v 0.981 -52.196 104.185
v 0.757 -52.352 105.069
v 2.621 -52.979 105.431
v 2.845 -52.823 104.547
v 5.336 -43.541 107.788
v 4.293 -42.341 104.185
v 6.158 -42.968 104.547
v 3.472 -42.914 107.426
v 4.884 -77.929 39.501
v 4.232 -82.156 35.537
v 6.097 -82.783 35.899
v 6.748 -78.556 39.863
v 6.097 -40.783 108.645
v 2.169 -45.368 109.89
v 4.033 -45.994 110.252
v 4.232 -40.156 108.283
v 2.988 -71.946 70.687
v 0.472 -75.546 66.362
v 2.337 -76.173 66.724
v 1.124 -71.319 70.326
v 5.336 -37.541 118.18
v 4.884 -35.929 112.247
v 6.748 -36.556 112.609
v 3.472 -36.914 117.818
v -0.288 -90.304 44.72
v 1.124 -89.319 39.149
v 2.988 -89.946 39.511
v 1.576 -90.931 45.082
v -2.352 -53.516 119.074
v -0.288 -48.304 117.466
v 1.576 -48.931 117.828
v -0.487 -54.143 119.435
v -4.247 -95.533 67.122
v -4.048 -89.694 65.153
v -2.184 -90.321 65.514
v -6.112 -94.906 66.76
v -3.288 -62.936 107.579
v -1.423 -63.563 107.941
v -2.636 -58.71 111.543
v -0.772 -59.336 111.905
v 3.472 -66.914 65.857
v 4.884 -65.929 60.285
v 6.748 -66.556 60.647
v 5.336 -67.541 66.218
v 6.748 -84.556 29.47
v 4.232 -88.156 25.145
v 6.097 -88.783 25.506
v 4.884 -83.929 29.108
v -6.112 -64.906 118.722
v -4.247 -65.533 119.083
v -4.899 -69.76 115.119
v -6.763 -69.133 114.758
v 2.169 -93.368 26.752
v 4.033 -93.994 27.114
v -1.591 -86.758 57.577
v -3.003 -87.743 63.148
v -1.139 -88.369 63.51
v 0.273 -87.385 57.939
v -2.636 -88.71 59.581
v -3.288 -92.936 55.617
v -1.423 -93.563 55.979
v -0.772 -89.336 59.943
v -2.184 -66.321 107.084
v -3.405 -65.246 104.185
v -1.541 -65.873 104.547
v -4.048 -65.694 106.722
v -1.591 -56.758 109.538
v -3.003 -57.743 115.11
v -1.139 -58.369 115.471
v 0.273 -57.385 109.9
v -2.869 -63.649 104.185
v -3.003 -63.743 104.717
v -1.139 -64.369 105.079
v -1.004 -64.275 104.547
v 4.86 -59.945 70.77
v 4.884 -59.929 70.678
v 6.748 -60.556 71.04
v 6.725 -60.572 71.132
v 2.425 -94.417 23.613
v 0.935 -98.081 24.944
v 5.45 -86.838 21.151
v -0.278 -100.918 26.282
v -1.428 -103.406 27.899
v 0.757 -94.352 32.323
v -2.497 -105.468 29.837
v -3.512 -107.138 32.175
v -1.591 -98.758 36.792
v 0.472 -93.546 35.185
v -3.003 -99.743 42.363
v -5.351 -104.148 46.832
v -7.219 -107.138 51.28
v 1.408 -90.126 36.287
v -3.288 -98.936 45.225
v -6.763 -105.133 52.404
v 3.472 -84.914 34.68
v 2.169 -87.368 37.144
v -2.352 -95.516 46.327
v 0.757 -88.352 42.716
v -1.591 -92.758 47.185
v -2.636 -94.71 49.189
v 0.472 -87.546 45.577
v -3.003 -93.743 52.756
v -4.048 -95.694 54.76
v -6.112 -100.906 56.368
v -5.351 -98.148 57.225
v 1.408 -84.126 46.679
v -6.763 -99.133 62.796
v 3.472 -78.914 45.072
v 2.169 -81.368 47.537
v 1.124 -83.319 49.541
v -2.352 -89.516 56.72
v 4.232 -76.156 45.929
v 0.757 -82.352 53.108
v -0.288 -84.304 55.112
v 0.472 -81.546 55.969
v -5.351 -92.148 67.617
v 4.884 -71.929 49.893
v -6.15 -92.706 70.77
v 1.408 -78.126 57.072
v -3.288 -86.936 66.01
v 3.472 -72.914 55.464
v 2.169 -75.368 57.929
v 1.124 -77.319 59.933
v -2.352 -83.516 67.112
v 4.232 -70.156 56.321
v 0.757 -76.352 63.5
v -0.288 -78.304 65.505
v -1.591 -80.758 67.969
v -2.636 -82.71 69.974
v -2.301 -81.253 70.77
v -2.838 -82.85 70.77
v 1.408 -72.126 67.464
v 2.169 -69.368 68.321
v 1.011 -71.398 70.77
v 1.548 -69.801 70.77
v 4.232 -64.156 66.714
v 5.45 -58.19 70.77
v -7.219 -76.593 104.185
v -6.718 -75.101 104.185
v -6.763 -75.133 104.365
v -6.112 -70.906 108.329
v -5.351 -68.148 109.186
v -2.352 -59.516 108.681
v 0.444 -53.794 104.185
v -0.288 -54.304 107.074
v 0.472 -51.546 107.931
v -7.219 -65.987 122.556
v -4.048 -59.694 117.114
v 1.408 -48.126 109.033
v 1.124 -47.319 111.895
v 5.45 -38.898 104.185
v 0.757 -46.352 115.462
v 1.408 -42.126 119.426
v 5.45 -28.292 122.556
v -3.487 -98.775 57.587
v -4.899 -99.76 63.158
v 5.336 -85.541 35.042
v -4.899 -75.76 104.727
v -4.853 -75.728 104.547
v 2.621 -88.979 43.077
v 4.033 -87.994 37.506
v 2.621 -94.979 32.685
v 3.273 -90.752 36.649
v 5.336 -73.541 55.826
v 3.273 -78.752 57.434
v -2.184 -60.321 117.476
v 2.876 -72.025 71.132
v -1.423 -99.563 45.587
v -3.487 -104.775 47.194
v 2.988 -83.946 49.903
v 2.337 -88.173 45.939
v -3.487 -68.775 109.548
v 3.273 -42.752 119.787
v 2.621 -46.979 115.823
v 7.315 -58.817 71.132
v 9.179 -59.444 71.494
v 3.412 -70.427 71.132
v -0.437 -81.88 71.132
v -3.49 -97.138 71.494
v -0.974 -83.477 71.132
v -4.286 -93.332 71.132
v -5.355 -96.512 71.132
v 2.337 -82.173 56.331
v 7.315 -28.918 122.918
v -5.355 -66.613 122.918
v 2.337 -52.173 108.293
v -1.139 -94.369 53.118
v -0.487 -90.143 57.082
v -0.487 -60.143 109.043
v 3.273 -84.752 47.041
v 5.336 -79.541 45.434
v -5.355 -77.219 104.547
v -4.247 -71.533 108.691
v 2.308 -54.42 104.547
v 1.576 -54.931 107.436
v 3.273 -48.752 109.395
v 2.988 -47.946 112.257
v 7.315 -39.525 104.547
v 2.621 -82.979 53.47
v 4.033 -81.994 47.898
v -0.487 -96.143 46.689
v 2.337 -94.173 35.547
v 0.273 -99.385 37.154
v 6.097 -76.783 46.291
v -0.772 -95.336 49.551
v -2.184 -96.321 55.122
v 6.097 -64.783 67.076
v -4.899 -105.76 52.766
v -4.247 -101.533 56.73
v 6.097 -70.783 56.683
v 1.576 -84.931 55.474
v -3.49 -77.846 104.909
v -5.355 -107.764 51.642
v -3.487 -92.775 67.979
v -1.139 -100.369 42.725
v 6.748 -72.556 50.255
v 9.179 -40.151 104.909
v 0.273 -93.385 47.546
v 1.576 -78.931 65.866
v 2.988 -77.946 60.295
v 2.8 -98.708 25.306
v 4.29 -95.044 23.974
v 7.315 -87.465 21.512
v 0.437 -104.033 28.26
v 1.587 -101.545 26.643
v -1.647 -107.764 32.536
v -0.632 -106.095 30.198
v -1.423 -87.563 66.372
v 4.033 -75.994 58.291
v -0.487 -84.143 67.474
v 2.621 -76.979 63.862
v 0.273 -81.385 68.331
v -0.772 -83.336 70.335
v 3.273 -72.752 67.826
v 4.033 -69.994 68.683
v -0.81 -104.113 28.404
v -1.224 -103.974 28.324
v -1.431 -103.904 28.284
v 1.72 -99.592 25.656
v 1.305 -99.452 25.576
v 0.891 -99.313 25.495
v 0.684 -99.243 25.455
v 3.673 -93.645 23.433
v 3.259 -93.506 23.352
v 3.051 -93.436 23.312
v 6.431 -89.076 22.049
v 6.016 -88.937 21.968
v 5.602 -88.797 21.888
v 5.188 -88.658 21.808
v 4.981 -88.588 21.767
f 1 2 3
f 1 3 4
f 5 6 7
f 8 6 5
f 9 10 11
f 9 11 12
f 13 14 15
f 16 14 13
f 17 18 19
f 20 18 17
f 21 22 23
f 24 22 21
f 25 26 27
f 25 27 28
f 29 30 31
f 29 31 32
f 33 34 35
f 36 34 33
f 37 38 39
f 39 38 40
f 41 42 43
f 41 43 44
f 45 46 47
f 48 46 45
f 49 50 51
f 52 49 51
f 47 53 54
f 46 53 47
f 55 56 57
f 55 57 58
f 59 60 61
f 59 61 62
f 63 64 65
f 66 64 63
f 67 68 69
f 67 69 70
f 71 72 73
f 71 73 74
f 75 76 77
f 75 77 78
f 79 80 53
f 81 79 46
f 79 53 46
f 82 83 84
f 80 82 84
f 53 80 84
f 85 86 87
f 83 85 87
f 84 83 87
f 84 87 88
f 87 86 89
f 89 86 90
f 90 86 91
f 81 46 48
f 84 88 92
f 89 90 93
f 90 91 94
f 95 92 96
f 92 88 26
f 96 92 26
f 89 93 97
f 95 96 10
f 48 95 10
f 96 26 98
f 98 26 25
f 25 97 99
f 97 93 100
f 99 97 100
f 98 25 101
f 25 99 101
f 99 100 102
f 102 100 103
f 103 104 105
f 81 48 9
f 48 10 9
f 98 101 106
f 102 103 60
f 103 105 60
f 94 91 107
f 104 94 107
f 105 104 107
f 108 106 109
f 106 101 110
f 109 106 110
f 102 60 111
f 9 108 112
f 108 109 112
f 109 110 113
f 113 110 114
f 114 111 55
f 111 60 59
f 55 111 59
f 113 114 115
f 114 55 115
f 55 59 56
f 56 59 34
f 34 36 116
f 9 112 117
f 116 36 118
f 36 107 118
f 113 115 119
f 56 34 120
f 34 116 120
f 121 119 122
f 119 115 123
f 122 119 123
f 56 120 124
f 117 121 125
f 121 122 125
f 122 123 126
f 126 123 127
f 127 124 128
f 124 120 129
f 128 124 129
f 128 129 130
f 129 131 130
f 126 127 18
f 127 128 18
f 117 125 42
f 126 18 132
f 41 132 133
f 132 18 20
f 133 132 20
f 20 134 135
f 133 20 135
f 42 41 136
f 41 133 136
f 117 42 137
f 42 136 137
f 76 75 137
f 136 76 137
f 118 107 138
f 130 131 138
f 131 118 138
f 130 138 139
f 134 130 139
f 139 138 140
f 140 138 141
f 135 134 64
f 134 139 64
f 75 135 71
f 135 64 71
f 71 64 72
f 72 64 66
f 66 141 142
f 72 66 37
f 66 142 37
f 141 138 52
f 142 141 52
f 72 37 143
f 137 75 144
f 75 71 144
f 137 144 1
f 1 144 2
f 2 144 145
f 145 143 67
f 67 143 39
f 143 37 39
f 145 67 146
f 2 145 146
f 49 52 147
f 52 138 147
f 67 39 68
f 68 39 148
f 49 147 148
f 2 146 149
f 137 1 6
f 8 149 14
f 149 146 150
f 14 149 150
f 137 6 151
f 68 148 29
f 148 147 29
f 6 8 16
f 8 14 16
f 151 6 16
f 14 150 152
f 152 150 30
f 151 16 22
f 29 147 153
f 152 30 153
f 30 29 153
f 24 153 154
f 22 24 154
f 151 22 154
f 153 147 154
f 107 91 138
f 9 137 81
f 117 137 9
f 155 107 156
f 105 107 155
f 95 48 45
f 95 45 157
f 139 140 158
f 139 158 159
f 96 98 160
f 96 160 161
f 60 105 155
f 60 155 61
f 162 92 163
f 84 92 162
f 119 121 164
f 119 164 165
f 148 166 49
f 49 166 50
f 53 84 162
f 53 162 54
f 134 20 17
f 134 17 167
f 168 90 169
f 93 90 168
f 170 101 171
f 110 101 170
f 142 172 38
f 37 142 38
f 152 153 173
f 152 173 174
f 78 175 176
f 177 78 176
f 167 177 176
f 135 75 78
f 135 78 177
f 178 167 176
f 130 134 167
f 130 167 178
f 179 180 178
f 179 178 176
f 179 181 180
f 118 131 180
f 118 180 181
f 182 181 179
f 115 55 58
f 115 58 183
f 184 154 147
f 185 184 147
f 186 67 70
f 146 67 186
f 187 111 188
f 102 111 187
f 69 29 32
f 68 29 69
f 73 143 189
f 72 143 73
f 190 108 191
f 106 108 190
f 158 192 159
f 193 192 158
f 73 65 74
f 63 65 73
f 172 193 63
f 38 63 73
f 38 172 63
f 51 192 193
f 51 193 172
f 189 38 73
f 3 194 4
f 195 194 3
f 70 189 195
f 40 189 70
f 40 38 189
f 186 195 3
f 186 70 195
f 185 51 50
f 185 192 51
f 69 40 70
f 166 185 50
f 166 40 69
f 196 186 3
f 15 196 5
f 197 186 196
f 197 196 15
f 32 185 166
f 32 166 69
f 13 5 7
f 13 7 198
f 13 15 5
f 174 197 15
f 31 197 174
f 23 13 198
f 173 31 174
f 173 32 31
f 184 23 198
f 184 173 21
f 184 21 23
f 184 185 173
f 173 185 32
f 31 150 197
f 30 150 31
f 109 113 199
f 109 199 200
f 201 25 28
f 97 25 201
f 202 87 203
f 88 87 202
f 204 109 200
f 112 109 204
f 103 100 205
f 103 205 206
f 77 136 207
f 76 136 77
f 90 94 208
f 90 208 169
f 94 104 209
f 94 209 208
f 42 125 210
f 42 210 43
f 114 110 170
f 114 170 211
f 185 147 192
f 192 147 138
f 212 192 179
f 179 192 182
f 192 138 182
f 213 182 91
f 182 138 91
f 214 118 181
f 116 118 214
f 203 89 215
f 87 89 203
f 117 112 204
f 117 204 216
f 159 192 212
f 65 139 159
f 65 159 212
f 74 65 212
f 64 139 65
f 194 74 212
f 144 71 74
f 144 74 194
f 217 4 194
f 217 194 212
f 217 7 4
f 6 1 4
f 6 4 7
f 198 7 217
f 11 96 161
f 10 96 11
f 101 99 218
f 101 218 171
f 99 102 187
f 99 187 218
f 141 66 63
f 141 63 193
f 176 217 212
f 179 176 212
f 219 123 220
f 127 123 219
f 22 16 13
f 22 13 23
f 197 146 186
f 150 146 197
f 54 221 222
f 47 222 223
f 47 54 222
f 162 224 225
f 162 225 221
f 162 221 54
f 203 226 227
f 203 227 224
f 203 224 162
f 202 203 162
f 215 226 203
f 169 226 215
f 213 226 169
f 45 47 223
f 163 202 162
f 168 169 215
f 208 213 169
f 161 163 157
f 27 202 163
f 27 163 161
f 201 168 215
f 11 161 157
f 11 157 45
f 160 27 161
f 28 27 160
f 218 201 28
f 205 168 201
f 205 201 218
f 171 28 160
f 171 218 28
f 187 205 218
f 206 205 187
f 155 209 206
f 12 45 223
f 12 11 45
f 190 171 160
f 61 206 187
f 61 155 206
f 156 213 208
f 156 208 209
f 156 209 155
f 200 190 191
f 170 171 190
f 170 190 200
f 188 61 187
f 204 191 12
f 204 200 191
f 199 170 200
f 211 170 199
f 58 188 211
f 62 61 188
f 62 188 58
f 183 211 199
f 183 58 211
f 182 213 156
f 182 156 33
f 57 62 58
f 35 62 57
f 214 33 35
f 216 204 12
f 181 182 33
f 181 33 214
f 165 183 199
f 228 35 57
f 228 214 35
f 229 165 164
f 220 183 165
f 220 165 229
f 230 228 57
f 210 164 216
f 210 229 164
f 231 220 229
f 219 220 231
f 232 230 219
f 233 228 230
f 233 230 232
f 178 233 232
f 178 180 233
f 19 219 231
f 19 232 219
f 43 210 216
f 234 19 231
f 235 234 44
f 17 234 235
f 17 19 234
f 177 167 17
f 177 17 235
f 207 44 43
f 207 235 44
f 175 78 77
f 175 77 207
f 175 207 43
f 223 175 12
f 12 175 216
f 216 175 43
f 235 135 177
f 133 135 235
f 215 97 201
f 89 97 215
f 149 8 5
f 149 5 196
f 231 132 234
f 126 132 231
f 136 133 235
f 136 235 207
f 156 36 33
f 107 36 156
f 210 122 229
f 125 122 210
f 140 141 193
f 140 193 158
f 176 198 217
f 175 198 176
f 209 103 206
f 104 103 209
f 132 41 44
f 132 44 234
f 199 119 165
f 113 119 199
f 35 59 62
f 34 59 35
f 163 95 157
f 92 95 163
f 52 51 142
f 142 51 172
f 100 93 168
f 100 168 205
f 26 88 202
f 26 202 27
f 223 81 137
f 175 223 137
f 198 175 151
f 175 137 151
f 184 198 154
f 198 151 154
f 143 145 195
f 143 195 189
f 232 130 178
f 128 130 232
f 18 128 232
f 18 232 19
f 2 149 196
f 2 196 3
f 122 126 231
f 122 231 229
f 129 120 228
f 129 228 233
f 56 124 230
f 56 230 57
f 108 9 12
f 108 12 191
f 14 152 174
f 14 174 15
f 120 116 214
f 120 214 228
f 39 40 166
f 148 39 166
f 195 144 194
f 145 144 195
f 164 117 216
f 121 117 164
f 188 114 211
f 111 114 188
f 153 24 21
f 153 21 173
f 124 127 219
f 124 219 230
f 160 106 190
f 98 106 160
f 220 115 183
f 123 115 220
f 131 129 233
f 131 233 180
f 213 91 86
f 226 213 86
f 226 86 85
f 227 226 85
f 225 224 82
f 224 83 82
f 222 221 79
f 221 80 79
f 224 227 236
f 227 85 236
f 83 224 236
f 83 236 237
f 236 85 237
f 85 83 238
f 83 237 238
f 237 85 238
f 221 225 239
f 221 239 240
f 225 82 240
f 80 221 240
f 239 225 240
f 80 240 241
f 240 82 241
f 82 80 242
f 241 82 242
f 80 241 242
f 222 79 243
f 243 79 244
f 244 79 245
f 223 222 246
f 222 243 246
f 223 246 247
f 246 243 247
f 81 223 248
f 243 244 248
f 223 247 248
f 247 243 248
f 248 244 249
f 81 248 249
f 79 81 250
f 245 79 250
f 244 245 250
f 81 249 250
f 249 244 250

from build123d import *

# Parameters (mm, degrees)
BOSS_EXTRUDE1_DEPTH      = 2
CUT_EXTRUDE2_DEPTH       = 2
FILL_START               = 36.116581205
FILL_PATTERN1_DEPTH      = 2
BOSS_EXTRUDE2_DEPTH      = 2
BOSS_EXTRUDE2_DEPTH_BACK = 2


# Read off the part's stored shape, not the designer's step: Fill Pattern1
with BuildPart() as part:
    # Sketch1 → Boss-Extrude1 (new body)
    with BuildSketch(Plane(origin=(33.669790065, -11.316558939, 6.533618345), x_dir=(0.3075963595688898, 0.9496429323114018, 0.059689033255435724), z_dir=(0.9322529691900319, -0.3133341684384297, 0.1809035663699512))):
        with BuildLine():
            Line((-57.568945453, 121.68686406), (-100.902387075, 51.715943852))
            Line((-100.902387075, 51.715943852), (-100.902387075, 32.254389388))
            add(Edge.make_bspline(
                [(-100.902387075, 32.254389388), (-100.442473357, 31.458808563), (-99.383581078, 29.928136313), (-97.483264926, 27.996228976), (-95.226180551, 26.317886768), (-92.562665334, 24.828690878), (-89.619940932, 23.519356376), (-86.433701886, 22.304158353), (-83.615975501, 21.289615886), (-81.305064927, 20.428782251), (-80.113678401, 19.962997336), (-79.526238835, 19.725091457)],
                knots=[0.001143674, 0.001143674, 0.001143674, 0.001143674, 0.119233579, 0.237323485, 0.35541339, 0.473503295, 0.5915932, 0.709683105, 0.82777301, 0.886817963, 0.945862915, 0.945862915, 0.945862915, 0.945862915], degree=3))
            Line((-79.526238835, 19.725091457), (-17.875333173, 119.273395013))
            Line((-17.875333173, 119.273395013), (-57.568945453, 121.68686406))
        make_face()
    extrude(amount=BOSS_EXTRUDE1_DEPTH)

    # Sketch2 → Cut-Extrude2 (cut)
    with BuildSketch(Plane(origin=(35.534296004, -11.943227276, 6.895425478), x_dir=(0.30759635956877757, 0.9496429323114396, 0.05968903325541397), z_dir=(0.9322529691900542, -0.3133341684383154, 0.18090356637003419))):
        Polygon((-60.882260573, 113.944557721), (-59.845221607, 108.206275442), (-54.357203896, 106.235236392), (-49.906225151, 110.002479621), (-50.943264117, 115.7407619), (-56.431281828, 117.71180095), align=None)
    extrude(amount=-CUT_EXTRUDE2_DEPTH, mode=Mode.SUBTRACT)

    # Fill Pattern1 outline → Fill Pattern1 (cut)
    with BuildSketch(Plane(origin=(0, 0, 0), x_dir=(0.3075963595751989, 0.9496429323114397, 0.05968903322232153), z_dir=(0.9322529691900542, -0.31333416843831513, 0.18090356637003466)).offset(FILL_START)):
        Polygon((-82.988049322, 35.354420584), (-87.439028067, 31.587177355), (-86.4019891, 25.848895075), (-80.913971389, 23.877856025), (-76.462992645, 27.645099254), (-77.500031611, 33.383381534), align=None)
        Polygon((-38.760899761, 106.768419503), (-43.211878505, 103.001176274), (-42.174839539, 97.262893995), (-36.686821828, 95.291854945), (-32.235843083, 99.059098174), (-33.27288205, 104.797380453), align=None)
        Polygon((-50.755172908, 107.139110303), (-55.206151653, 103.371867074), (-54.169112686, 97.633584795), (-48.681094975, 95.662545745), (-44.230116231, 99.429788974), (-45.267155197, 105.168071253), align=None)
        Polygon((-45.079063984, 96.566419658), (-49.530042728, 92.799176429), (-48.493003762, 87.060894149), (-43.004986051, 85.089855099), (-38.554007306, 88.857098328), (-39.591046273, 94.595380608), align=None)
        Polygon((-62.749446055, 107.509801103), (-67.2004248, 103.742557873), (-66.163385834, 98.004275594), (-60.675368123, 96.033236544), (-56.224389378, 99.800479773), (-57.261428344, 105.538762052), align=None)
        Polygon((-44.437008685, 117.341110149), (-48.88798743, 113.573866919), (-47.850948463, 107.83558464), (-42.362930752, 105.86454559), (-37.911952008, 109.631788819), (-38.948990974, 115.370071098), align=None)
        Polygon((-32.442735538, 116.970419349), (-36.893714282, 113.20317612), (-35.856675316, 107.464893841), (-30.368657605, 105.493854791), (-25.91767886, 109.26109802), (-26.954717827, 114.999380299), align=None)
        Polygon((-88.022102947, 66.70180172), (-92.473081692, 62.934558491), (-91.436042726, 57.196276212), (-85.948025015, 55.225237161), (-81.49704627, 58.992480391), (-82.534085236, 64.73076267), align=None)
        Polygon((-70.351720876, 55.758420275), (-74.802699621, 51.991177046), (-73.765660654, 46.252894767), (-68.277642943, 44.281855717), (-63.826664199, 48.049098946), (-64.863703165, 53.787381225), align=None)
        Polygon((-81.703938724, 76.903801566), (-86.154917469, 73.136558336), (-85.117878503, 67.398276057), (-79.629860792, 65.427237007), (-75.178882047, 69.194480236), (-76.215921013, 74.932762515), align=None)
        Polygon((-76.0278298, 66.33111092), (-80.478808545, 62.563867691), (-79.441769579, 56.825585412), (-73.953751868, 54.854546362), (-69.502773123, 58.621789591), (-70.539812089, 64.36007187), align=None)
        Polygon((-94.34026717, 56.499801874), (-98.791245915, 52.732558645), (-97.754206949, 46.994276366), (-92.266189238, 45.023237316), (-87.815210493, 48.790480545), (-88.852249459, 54.528762824), align=None)
        Polygon((-88.664158246, 45.927111229), (-93.115136991, 42.159868), (-92.078098025, 36.421585721), (-86.590080314, 34.450546671), (-82.139101569, 38.2177899), (-83.176140535, 43.956072179), align=None)
        Polygon((-82.345994023, 56.129111075), (-86.796972768, 52.361867846), (-85.759933802, 46.623585566), (-80.271916091, 44.652546516), (-75.820937346, 48.419789745), (-76.857976312, 54.158072025), align=None)
        Polygon((-76.669885099, 45.556420429), (-81.120863844, 41.7891772), (-80.083824877, 36.050894921), (-74.595807166, 34.079855871), (-70.144828422, 37.8470991), (-71.181867388, 43.585381379), align=None)
        Polygon((-69.067610278, 97.307801257), (-73.518589023, 93.540558028), (-72.481550057, 87.802275749), (-66.993532346, 85.831236698), (-62.542553601, 89.598479928), (-63.579592567, 95.336762207), align=None)
        Polygon((-63.391501354, 86.735110612), (-67.842480099, 82.967867383), (-66.805441132, 77.229585103), (-61.317423421, 75.258546053), (-56.866444677, 79.025789282), (-57.903483643, 84.764071561), align=None)
        Polygon((-57.073337131, 96.937110457), (-61.524315876, 93.169867228), (-60.487276909, 87.431584949), (-54.999259198, 85.460545899), (-50.548280454, 89.227789128), (-51.58531942, 94.966071407), align=None)
        Polygon((-51.397228207, 86.364419812), (-55.848206951, 82.597176583), (-54.811167985, 76.858894304), (-49.323150274, 74.887855254), (-44.872171529, 78.655098483), (-45.909210496, 84.393380762), align=None)
        Polygon((-69.709665577, 76.533110766), (-74.160644322, 72.765867537), (-73.123605356, 67.027585258), (-67.635587645, 65.056546208), (-63.1846089, 68.823789437), (-64.221647866, 74.562071716), align=None)
        Polygon((-64.033556653, 65.960420121), (-68.484535398, 62.193176892), (-67.447496431, 56.454894612), (-61.95947872, 54.483855562), (-57.508499976, 58.251098791), (-58.545538942, 63.989381071), align=None)
        Polygon((-75.385774501, 87.105801411), (-79.836753246, 83.338558182), (-78.79971428, 77.600275903), (-73.311696569, 75.629236853), (-68.860717824, 79.396480082), (-69.89775679, 85.134762361), align=None)
        Polygon((-57.71539243, 76.162419966), (-62.166371175, 72.395176737), (-61.129332208, 66.656894458), (-55.641314497, 64.685855408), (-51.190335753, 68.453098637), (-52.227374719, 74.191380916), align=None)
    extrude(amount=FILL_PATTERN1_DEPTH, mode=Mode.SUBTRACT)

    # Sketch3 → Boss-Extrude2 (add, two sides: drawn at the far end of the back side and taken through both)
    with BuildSketch(Plane(origin=(35.534296004, -11.943227276, 6.895425478), x_dir=(0.3075963595751957, 0.9496429323114406, 0.05968903322232247), z_dir=(0.9322529691900543, -0.31333416843831224, 0.1809035663700394)).offset(-BOSS_EXTRUDE2_DEPTH_BACK)):
        Polygon((-68.737584877, 103.652755792), (-29.043972597, 101.239286747), (-49.359262726, 68.435994613), (-89.052875005, 70.849463659), align=None)
    extrude(amount=BOSS_EXTRUDE2_DEPTH + BOSS_EXTRUDE2_DEPTH_BACK)


solid = part.part
